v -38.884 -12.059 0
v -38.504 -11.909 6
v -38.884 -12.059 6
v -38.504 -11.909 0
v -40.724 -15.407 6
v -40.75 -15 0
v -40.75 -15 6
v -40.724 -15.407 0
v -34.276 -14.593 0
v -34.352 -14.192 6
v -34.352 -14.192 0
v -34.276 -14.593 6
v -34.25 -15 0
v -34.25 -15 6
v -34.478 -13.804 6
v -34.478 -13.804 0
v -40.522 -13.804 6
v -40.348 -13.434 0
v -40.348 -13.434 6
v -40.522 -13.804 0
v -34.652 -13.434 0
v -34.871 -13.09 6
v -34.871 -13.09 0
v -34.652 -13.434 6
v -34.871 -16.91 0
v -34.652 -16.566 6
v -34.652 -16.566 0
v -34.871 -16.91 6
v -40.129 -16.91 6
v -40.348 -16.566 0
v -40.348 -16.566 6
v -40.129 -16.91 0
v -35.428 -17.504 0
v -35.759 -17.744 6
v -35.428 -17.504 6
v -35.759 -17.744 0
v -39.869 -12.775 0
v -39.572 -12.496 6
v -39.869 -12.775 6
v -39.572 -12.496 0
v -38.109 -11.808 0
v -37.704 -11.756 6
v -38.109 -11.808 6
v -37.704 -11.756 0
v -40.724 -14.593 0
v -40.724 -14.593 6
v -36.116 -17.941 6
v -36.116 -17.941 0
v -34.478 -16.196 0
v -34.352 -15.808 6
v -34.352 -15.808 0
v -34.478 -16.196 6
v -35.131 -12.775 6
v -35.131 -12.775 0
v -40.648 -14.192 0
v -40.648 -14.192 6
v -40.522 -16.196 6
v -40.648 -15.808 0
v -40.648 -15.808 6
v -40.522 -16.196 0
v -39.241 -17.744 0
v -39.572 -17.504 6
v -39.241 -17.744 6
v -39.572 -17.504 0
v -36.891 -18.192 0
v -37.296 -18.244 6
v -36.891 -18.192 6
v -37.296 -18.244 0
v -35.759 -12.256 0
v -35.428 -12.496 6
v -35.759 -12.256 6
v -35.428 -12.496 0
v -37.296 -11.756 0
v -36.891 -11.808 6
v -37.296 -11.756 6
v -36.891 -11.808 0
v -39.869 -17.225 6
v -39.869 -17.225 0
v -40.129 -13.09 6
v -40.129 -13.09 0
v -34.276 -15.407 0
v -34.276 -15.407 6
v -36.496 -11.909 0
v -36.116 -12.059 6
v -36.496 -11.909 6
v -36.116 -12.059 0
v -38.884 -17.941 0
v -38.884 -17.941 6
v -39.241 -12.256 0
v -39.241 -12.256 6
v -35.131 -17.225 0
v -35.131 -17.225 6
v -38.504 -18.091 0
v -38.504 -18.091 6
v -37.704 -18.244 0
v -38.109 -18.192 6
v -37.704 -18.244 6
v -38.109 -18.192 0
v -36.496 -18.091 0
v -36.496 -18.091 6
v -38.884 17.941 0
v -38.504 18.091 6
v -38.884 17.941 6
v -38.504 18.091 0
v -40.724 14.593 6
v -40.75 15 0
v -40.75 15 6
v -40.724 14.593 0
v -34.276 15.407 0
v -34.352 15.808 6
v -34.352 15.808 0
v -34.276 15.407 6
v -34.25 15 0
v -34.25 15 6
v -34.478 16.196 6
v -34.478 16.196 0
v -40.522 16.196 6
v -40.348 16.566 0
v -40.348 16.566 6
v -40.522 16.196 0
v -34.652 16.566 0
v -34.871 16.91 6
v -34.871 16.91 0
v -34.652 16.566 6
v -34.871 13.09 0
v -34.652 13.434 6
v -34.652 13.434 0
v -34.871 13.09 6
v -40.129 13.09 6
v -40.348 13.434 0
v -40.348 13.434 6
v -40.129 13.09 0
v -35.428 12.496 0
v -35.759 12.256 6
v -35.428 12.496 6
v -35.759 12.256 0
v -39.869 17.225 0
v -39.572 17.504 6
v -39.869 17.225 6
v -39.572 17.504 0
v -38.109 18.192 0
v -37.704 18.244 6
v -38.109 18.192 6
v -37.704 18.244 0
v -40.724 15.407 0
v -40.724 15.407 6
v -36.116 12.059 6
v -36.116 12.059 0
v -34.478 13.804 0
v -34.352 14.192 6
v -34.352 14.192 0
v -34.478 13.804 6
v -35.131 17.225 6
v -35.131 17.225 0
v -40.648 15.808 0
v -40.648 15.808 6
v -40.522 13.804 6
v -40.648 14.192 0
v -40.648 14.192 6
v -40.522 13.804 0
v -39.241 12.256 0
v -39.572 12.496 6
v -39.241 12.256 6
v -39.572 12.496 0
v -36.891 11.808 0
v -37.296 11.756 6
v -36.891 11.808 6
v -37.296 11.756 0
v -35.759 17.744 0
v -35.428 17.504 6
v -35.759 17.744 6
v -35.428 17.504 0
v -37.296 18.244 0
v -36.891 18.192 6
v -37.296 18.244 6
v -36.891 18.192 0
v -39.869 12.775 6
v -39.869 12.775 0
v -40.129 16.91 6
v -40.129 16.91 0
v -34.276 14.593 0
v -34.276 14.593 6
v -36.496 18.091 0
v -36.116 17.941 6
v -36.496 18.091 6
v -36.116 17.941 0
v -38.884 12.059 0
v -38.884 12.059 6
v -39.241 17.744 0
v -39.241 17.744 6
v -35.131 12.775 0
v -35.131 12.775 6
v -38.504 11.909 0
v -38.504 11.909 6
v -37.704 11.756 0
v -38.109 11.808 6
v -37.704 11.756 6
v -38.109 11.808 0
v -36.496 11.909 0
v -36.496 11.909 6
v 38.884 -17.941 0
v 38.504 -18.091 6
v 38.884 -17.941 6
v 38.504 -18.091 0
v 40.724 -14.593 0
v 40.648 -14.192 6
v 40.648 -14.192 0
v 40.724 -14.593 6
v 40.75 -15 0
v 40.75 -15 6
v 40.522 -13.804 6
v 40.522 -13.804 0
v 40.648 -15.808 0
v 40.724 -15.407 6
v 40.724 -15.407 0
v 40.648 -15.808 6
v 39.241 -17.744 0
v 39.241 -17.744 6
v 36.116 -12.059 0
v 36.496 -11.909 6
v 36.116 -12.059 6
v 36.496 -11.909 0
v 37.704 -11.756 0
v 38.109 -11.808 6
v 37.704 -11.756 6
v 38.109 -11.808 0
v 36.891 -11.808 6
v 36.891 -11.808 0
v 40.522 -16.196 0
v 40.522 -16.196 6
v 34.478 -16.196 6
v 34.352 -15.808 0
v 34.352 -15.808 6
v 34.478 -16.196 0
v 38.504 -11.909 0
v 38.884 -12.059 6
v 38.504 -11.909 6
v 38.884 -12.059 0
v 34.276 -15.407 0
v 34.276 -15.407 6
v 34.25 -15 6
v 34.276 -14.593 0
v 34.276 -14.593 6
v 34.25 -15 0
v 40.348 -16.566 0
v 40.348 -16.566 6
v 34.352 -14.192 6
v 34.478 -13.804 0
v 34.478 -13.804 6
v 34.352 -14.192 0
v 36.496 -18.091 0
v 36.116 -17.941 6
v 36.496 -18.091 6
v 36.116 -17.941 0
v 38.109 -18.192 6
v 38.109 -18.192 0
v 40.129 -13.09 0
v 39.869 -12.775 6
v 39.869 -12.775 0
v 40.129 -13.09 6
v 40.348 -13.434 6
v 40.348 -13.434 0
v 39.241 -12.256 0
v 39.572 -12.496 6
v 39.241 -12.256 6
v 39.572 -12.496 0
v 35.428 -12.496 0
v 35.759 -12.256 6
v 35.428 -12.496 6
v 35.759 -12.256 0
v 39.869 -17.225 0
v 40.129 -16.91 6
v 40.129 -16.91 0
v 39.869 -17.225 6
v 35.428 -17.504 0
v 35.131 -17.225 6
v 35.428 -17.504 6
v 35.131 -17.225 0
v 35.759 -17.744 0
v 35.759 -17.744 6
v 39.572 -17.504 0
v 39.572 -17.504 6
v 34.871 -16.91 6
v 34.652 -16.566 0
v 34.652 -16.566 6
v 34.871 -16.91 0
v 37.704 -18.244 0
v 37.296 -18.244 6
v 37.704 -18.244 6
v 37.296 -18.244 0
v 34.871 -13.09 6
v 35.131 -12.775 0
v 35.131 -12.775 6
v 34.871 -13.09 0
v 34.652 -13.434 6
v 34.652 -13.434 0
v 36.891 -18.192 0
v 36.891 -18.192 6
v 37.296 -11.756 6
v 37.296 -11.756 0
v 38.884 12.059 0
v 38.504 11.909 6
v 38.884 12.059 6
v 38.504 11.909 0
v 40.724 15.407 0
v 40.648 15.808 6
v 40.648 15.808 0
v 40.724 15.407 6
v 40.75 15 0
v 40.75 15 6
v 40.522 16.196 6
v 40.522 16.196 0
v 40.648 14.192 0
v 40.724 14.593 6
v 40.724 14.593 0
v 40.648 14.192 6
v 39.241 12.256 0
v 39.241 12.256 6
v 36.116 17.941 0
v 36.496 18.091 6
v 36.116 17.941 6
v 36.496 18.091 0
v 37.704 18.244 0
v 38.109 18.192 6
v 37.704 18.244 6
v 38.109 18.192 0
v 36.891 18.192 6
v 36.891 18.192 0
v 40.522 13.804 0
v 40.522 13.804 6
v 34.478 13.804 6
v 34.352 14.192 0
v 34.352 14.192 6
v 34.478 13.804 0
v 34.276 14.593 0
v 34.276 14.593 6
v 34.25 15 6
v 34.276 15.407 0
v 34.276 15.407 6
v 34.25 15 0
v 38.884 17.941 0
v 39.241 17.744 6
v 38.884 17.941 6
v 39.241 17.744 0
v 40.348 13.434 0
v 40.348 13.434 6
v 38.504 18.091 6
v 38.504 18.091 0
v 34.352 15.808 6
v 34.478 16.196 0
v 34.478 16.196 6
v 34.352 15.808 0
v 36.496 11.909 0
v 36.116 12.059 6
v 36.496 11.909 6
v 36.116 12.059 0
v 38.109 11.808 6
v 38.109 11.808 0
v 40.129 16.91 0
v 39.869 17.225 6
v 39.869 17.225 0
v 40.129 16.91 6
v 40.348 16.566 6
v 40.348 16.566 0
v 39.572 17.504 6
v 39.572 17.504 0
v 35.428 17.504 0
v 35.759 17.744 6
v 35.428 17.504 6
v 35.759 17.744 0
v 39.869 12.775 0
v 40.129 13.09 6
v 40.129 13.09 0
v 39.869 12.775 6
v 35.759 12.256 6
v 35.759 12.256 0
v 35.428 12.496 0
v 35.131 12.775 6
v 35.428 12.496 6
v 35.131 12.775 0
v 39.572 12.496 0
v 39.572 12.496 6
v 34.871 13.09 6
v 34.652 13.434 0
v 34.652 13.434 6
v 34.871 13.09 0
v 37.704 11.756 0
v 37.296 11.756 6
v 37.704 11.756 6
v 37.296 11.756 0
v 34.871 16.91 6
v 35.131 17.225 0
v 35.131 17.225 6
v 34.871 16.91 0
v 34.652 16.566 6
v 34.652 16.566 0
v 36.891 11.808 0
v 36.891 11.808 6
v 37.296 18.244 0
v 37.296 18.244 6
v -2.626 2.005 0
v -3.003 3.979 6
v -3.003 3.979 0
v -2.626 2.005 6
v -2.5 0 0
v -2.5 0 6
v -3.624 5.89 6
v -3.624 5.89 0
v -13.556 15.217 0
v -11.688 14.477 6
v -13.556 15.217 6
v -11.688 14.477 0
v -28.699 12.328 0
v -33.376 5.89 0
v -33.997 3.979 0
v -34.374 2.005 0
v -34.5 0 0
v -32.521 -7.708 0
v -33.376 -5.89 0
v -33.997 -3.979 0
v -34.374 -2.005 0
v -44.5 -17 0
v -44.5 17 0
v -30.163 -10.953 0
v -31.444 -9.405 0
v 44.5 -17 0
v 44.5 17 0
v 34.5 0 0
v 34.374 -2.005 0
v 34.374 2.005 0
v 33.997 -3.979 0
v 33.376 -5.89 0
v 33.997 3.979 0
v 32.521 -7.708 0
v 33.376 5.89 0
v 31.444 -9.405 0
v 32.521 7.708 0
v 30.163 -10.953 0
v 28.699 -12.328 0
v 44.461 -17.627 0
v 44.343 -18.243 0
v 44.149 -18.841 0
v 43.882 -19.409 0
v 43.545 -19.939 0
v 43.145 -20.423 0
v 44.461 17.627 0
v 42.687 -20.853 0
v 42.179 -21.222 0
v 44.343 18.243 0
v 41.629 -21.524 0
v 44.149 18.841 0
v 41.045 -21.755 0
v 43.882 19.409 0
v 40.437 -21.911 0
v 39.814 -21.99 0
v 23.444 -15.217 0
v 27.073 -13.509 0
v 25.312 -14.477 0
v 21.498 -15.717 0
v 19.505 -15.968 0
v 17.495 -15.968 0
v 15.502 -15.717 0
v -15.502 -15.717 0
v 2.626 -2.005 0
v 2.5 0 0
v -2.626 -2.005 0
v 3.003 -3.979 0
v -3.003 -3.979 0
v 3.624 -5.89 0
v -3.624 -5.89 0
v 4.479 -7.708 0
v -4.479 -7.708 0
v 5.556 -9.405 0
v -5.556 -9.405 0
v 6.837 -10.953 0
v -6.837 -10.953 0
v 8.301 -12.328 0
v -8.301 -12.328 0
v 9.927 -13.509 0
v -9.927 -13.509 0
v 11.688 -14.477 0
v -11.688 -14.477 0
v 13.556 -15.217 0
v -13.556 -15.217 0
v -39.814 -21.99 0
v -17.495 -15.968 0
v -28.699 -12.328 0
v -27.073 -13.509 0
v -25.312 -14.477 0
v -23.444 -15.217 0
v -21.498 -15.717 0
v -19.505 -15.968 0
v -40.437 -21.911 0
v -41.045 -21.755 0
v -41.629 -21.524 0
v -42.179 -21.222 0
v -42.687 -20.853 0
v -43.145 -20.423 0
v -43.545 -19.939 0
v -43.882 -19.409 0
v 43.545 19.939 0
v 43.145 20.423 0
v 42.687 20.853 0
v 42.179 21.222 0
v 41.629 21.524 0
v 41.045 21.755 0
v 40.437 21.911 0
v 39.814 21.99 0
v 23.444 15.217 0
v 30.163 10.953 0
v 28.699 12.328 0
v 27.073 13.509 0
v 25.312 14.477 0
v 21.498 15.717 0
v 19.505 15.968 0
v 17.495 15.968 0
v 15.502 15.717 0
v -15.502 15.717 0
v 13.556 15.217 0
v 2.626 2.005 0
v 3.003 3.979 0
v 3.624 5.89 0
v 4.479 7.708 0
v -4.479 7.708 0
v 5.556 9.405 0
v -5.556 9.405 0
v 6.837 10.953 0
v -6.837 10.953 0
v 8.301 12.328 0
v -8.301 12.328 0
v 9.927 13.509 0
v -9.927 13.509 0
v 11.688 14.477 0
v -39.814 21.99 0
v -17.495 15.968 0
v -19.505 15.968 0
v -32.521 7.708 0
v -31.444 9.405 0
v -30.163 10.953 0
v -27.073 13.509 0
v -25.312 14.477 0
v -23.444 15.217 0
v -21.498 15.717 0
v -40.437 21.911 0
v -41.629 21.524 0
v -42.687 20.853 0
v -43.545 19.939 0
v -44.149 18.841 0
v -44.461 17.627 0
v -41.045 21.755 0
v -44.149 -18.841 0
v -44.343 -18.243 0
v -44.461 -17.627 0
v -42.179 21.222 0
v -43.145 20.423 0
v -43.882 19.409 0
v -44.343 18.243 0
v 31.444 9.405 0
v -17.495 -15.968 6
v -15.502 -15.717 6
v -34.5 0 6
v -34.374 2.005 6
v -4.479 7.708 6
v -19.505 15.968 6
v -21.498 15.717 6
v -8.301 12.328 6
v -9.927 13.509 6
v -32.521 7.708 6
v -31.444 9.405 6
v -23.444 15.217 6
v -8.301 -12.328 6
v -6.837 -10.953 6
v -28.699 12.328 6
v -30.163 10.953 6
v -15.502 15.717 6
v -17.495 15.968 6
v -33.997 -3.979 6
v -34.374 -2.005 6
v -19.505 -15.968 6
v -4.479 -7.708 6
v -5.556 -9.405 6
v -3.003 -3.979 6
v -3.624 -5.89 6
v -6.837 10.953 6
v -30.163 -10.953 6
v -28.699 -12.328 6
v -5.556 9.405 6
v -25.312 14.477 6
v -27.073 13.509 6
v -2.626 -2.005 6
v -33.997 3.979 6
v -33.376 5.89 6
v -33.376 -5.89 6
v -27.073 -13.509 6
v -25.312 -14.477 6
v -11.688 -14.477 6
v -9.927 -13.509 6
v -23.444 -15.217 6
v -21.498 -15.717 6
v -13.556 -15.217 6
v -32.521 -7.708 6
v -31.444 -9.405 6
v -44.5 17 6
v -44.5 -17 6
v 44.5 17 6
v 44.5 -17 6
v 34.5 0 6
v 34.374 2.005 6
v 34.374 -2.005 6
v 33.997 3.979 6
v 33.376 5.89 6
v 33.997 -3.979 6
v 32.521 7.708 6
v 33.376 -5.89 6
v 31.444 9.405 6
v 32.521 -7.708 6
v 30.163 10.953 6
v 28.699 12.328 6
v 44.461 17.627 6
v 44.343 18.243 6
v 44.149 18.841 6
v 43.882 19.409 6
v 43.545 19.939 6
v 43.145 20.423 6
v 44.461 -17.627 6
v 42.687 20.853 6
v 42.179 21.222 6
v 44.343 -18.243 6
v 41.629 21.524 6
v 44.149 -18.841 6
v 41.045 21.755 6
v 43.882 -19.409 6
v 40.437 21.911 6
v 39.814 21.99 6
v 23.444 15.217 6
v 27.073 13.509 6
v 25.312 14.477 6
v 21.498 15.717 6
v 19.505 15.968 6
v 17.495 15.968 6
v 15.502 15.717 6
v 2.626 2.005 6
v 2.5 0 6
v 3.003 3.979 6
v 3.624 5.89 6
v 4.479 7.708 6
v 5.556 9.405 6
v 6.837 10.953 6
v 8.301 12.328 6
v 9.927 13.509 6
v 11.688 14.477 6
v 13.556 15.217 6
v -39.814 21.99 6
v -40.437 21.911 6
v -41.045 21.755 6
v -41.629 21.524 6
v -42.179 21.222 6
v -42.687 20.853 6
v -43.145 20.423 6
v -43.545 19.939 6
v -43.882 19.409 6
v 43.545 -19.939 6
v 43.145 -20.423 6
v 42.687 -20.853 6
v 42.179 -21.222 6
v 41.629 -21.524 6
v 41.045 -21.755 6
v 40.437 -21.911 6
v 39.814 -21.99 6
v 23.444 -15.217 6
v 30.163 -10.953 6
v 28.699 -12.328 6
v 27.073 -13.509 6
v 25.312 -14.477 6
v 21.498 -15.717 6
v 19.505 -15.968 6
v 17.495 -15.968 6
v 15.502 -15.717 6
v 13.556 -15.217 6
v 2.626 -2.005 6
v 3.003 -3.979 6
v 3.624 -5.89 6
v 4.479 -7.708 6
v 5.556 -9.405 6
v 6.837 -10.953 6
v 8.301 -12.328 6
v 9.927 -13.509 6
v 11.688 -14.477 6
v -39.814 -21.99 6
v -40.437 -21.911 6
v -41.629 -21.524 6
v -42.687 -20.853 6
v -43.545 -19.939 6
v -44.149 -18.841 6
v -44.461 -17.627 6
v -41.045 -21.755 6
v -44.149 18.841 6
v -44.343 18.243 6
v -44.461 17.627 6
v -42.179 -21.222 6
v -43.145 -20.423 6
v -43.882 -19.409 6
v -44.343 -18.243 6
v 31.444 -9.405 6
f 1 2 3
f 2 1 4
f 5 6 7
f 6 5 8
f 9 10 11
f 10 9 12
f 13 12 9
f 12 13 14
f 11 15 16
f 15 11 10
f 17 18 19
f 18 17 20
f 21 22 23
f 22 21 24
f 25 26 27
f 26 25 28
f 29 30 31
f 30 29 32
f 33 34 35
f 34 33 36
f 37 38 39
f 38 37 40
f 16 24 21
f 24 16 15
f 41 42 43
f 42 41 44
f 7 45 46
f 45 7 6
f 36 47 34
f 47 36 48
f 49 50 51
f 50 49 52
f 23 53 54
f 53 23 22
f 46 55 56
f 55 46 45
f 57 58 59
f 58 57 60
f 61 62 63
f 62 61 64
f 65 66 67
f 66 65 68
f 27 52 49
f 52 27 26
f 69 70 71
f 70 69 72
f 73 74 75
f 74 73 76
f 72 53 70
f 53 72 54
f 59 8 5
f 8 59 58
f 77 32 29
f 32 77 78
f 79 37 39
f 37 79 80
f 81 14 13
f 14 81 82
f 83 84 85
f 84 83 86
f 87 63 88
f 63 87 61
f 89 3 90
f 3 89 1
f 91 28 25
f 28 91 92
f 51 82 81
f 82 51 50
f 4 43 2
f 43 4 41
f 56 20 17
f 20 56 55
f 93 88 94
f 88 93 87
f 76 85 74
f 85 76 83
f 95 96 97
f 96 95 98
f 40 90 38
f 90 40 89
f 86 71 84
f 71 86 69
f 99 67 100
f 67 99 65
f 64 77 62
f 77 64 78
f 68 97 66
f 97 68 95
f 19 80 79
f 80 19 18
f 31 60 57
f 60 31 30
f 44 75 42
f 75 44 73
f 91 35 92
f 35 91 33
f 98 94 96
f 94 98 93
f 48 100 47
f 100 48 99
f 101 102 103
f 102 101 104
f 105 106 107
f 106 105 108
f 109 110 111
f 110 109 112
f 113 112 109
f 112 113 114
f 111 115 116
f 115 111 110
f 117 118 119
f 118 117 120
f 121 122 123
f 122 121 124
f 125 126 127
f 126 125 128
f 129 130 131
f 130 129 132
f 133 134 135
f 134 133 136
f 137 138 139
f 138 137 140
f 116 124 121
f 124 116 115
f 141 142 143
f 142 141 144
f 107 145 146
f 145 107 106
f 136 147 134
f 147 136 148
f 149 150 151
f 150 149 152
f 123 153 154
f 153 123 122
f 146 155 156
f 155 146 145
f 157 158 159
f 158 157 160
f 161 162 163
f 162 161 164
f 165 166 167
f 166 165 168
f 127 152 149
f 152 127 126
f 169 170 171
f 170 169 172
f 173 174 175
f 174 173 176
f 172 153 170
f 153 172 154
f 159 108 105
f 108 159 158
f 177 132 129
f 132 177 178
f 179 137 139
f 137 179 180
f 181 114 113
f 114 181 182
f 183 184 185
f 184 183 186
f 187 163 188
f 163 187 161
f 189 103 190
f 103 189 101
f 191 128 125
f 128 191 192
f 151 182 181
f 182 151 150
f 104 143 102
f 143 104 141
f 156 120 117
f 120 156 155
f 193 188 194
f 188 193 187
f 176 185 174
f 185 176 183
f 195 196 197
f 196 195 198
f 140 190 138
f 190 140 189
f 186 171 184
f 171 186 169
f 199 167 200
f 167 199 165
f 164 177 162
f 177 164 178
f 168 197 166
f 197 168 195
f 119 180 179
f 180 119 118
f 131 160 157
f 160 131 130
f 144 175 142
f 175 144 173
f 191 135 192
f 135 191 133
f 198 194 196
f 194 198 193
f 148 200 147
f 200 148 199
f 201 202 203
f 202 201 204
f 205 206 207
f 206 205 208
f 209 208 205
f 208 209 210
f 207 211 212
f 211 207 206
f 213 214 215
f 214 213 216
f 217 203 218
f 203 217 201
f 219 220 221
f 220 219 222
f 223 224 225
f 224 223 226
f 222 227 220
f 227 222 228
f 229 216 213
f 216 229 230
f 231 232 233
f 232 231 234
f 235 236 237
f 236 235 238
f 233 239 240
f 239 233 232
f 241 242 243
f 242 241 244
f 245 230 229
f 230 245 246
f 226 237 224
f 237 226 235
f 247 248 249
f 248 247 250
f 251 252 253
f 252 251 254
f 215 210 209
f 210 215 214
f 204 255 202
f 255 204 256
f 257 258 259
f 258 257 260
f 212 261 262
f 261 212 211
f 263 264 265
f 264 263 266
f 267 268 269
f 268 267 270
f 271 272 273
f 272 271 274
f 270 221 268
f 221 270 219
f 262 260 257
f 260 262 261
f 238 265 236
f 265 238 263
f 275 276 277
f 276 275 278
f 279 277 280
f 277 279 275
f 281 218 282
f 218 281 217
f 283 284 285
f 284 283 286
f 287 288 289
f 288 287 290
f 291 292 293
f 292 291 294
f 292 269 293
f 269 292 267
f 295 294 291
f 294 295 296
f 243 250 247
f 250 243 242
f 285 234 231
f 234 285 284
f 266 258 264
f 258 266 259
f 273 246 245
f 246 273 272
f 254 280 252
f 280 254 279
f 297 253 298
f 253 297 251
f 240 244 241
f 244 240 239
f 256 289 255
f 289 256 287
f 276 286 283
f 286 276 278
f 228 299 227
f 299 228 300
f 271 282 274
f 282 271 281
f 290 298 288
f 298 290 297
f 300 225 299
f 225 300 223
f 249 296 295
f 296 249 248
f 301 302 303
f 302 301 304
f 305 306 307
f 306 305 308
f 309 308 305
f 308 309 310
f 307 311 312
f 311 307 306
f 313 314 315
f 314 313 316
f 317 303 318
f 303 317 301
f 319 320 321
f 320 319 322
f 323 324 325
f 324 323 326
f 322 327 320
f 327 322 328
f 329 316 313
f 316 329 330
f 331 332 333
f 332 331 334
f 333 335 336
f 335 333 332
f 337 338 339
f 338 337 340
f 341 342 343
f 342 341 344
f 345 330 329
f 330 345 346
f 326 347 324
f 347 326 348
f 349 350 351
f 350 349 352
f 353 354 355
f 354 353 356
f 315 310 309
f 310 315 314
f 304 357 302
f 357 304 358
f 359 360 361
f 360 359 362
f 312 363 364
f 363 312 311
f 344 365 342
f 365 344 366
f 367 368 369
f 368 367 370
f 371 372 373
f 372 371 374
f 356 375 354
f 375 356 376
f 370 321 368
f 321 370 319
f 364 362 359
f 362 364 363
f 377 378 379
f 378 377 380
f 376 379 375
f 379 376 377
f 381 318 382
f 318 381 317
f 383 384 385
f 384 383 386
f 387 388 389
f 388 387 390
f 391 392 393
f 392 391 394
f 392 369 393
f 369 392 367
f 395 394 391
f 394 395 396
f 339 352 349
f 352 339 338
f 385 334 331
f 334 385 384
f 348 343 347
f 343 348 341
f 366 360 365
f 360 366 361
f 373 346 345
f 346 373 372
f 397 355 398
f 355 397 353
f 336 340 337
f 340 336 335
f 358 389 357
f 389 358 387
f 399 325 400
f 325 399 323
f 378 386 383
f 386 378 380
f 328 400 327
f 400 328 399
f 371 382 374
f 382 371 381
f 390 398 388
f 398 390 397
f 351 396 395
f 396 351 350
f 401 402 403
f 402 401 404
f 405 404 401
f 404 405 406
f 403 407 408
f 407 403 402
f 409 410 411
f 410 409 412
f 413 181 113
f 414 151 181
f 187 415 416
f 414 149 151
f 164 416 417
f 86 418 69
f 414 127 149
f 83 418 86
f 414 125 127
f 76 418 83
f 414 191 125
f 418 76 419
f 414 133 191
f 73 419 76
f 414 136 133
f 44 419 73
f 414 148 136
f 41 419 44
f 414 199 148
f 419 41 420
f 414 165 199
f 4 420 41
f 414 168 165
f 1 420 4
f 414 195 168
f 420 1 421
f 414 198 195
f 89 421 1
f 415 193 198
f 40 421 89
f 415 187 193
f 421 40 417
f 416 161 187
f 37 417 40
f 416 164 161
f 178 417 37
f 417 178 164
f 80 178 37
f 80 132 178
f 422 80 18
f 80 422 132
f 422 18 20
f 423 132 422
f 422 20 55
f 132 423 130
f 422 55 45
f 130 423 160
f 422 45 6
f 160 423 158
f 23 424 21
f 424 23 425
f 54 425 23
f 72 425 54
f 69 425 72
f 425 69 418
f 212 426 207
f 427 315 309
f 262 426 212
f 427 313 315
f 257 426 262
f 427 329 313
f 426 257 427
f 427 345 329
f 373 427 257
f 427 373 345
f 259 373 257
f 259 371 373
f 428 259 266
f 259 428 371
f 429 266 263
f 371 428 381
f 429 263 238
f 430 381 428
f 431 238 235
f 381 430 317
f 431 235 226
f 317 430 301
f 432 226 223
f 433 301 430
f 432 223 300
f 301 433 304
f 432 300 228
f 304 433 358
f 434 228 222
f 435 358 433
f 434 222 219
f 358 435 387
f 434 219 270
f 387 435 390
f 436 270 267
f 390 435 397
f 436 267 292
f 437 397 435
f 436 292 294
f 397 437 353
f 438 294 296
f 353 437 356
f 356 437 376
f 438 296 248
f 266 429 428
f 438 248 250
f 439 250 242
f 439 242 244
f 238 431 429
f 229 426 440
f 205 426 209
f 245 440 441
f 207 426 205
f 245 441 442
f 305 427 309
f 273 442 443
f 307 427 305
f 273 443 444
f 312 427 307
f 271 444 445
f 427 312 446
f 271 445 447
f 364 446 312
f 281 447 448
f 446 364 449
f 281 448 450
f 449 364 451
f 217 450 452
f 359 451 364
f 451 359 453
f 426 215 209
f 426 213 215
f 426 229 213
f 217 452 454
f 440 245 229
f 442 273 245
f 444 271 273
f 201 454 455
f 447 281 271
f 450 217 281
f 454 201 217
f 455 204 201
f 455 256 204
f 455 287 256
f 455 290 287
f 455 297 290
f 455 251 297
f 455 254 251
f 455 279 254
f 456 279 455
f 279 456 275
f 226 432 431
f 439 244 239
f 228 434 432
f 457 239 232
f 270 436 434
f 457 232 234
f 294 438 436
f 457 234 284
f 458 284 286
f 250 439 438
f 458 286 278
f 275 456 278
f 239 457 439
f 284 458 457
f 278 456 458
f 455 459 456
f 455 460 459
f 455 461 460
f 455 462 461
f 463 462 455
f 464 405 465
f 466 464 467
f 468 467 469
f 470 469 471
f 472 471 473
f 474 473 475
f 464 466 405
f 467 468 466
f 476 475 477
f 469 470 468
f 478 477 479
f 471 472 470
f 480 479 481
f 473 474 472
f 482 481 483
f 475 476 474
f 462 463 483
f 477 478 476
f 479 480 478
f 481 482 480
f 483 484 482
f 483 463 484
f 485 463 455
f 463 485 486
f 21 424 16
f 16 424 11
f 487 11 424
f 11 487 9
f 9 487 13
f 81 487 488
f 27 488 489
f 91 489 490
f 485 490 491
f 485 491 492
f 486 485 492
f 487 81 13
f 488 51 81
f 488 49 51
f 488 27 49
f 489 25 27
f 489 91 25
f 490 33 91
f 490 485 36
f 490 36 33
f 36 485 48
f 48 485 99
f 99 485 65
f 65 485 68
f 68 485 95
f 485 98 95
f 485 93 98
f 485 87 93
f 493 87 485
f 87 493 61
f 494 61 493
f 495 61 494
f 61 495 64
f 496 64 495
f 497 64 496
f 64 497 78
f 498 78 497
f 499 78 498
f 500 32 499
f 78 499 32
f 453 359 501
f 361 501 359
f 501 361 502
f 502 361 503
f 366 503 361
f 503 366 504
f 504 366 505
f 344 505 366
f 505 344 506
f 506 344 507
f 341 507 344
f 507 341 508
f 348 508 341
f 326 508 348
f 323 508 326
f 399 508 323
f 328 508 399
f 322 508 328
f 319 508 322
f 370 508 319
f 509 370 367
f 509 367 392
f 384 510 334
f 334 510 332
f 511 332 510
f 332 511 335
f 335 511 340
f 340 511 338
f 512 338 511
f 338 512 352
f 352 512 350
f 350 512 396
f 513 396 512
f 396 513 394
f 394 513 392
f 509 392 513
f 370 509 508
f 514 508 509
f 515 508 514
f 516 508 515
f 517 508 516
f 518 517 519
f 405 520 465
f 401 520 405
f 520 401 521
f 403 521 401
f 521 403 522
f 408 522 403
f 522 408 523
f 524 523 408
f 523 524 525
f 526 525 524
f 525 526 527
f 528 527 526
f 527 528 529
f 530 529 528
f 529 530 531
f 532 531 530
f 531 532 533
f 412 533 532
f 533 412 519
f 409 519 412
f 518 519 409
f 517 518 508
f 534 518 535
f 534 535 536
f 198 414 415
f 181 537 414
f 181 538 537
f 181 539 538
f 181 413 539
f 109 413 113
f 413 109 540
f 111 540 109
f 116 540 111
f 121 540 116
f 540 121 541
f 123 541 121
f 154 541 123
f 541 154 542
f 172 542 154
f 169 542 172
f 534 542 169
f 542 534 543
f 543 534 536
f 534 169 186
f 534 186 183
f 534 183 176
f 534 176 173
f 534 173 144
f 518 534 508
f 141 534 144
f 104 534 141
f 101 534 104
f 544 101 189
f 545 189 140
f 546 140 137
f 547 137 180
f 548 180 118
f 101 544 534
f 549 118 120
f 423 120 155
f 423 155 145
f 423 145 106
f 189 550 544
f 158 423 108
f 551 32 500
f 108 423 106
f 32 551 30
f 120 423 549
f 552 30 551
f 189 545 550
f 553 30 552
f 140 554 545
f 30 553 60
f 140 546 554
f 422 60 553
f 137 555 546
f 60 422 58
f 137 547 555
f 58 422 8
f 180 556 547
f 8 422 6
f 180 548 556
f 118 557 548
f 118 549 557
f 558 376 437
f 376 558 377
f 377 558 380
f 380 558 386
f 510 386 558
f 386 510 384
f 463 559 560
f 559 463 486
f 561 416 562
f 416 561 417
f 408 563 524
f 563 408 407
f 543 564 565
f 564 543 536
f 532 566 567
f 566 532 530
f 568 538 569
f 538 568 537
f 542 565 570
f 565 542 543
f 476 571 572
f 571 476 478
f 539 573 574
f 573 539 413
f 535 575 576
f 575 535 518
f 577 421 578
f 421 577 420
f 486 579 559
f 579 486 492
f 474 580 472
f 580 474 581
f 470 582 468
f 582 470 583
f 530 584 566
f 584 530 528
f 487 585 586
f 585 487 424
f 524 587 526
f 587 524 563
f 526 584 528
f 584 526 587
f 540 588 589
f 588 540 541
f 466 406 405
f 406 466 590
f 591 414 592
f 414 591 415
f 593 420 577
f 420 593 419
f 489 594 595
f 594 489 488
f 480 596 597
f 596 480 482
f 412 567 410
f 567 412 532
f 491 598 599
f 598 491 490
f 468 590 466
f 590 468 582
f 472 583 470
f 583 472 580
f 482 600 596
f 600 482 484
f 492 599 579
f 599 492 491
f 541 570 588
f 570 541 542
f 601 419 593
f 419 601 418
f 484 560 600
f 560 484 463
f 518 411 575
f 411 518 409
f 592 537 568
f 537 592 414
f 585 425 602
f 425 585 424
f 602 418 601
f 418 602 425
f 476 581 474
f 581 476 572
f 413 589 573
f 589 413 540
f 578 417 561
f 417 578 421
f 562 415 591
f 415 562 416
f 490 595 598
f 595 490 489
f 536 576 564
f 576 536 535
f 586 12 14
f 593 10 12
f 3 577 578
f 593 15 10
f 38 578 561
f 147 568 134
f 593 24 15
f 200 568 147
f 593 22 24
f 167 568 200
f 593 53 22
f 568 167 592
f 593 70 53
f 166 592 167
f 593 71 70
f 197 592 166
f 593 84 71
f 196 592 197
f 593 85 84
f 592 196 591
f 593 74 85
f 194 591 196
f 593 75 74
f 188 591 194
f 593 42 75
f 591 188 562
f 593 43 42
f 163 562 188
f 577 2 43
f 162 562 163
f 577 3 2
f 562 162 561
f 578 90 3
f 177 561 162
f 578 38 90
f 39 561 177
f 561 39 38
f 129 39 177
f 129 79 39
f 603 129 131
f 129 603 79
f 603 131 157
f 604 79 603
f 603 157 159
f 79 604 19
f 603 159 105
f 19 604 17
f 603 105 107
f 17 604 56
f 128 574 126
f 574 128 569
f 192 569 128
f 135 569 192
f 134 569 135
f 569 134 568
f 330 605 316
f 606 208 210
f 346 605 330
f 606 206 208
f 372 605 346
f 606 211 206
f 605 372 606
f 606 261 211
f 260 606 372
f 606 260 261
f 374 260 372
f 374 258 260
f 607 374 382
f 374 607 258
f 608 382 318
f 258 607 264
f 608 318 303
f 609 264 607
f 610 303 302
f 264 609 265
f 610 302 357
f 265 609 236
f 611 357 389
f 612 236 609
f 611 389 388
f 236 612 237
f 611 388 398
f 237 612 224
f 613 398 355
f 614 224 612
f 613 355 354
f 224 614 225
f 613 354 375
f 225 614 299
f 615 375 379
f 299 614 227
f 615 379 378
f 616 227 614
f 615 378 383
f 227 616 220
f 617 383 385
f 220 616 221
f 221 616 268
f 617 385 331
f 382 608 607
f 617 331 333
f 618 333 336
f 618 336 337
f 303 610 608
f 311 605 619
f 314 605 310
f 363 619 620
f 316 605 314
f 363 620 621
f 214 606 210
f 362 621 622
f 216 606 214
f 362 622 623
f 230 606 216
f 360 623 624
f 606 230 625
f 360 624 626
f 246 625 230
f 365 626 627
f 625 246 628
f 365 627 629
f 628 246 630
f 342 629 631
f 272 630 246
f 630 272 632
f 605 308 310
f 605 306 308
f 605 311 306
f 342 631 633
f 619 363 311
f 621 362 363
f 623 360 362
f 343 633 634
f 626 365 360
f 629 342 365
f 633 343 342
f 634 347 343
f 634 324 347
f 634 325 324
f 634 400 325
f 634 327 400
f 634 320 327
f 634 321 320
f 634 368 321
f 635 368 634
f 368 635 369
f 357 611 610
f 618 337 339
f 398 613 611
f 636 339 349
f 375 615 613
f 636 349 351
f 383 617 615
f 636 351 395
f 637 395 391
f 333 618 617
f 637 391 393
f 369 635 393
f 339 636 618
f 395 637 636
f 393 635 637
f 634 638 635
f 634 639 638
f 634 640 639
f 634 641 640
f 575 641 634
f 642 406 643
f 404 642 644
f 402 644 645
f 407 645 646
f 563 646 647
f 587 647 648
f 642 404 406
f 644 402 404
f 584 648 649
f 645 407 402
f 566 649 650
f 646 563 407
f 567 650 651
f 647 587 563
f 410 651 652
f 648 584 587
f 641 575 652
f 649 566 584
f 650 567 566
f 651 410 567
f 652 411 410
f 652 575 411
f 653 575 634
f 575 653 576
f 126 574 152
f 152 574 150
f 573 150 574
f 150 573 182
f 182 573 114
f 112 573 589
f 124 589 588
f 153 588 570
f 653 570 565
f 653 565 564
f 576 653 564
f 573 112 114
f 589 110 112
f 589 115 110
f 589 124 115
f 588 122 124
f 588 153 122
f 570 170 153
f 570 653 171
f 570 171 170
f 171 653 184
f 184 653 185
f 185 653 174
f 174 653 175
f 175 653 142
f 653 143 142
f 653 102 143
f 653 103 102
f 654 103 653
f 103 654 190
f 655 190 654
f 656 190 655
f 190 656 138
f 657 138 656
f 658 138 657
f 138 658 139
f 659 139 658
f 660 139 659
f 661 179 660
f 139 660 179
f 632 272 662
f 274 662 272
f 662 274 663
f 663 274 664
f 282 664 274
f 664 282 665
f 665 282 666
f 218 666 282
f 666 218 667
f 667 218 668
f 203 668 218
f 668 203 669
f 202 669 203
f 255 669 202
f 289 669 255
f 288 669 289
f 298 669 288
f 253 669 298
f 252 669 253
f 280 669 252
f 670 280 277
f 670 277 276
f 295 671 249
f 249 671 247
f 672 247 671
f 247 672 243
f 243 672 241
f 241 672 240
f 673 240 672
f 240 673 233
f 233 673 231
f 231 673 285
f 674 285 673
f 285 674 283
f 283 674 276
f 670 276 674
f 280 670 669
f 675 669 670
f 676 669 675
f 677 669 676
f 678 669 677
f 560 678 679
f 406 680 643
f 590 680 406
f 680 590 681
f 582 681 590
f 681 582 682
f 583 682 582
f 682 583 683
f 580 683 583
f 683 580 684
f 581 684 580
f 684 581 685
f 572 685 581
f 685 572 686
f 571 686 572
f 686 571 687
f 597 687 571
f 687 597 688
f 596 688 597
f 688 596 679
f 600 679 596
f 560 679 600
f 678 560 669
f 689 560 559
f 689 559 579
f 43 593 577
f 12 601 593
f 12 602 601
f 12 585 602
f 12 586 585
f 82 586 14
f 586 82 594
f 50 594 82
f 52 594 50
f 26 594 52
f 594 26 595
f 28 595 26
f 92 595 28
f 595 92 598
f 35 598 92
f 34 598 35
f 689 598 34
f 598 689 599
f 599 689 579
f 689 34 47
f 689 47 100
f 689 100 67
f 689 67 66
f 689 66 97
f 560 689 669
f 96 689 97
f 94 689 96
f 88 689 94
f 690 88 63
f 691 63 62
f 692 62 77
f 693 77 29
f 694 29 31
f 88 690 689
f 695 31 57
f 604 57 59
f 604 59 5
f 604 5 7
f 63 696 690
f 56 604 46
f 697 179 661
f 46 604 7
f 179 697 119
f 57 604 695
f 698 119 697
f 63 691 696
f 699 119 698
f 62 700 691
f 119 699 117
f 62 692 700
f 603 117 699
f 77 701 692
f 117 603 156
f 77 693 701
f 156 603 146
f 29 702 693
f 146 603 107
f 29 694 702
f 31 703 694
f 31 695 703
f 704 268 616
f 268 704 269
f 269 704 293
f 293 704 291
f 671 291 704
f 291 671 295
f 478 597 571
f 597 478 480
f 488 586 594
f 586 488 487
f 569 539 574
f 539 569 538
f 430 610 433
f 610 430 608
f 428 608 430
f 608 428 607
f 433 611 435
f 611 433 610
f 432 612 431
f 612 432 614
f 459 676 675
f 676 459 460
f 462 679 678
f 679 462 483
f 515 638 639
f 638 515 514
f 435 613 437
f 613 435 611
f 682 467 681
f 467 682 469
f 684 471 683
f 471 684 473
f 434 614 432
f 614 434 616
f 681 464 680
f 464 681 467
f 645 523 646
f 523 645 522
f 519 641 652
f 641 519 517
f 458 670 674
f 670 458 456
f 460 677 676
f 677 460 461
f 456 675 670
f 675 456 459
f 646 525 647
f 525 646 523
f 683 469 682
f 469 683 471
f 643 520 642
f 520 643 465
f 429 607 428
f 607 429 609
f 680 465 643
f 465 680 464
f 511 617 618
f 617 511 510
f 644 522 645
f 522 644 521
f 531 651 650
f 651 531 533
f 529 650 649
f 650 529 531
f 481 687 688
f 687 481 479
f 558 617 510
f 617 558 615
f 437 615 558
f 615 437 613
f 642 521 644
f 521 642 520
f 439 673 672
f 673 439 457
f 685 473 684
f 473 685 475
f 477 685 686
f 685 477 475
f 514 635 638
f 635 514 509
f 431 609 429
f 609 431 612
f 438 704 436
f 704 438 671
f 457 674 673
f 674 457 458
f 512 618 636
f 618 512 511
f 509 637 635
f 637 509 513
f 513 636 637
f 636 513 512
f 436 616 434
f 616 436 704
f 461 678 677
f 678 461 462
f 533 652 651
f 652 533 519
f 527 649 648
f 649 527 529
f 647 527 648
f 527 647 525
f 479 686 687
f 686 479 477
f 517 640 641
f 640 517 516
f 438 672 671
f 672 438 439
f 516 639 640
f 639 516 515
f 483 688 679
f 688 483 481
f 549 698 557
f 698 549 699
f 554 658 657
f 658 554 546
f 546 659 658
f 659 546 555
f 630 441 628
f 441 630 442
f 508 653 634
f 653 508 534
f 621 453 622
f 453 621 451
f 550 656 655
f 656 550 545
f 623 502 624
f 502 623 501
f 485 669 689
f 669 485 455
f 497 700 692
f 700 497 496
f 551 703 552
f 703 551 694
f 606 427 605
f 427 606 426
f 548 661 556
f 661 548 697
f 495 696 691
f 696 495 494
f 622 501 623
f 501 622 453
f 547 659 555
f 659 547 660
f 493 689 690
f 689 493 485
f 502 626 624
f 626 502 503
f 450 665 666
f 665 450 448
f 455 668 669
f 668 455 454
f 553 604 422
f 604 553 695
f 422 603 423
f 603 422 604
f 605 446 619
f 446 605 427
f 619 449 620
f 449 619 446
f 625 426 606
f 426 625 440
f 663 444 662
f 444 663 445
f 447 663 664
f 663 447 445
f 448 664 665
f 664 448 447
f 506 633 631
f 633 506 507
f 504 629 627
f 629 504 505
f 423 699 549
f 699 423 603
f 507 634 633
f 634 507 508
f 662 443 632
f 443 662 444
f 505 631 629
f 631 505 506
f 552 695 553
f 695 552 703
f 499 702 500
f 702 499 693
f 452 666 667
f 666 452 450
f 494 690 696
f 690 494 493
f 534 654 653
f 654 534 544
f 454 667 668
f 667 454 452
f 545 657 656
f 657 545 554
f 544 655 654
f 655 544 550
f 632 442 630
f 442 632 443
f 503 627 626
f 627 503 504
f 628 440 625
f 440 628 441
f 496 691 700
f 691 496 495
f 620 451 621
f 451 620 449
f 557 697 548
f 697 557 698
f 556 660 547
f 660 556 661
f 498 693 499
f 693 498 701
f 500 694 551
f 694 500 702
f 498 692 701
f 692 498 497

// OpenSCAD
$fn = 50;


difference() {
	union() {
		hull() {
			translate(v = [-39.5000000000, 17.0000000000, 0]) {
				cylinder(h = 6, r = 5);
			}
			translate(v = [39.5000000000, 17.0000000000, 0]) {
				cylinder(h = 6, r = 5);
			}
			translate(v = [-39.5000000000, -17.0000000000, 0]) {
				cylinder(h = 6, r = 5);
			}
			translate(v = [39.5000000000, -17.0000000000, 0]) {
				cylinder(h = 6, r = 5);
			}
		}
	}
	union() {
		#translate(v = [-37.5000000000, -15.0000000000, -100.0000000000]) {
			cylinder(h = 200, r = 3.2500000000);
		}
		#translate(v = [-37.5000000000, 15.0000000000, -100.0000000000]) {
			cylinder(h = 200, r = 3.2500000000);
		}
		#translate(v = [37.5000000000, -15.0000000000, -100.0000000000]) {
			cylinder(h = 200, r = 3.2500000000);
		}
		#translate(v = [37.5000000000, 15.0000000000, -100.0000000000]) {
			cylinder(h = 200, r = 3.2500000000);
		}
		#translate(v = [-18.5000000000, 0, 0]) {
			cylinder(h = 6, r = 16.0000000000);
		}
		#translate(v = [18.5000000000, 0, 0]) {
			cylinder(h = 6, r = 16.0000000000);
		}
	}
}
